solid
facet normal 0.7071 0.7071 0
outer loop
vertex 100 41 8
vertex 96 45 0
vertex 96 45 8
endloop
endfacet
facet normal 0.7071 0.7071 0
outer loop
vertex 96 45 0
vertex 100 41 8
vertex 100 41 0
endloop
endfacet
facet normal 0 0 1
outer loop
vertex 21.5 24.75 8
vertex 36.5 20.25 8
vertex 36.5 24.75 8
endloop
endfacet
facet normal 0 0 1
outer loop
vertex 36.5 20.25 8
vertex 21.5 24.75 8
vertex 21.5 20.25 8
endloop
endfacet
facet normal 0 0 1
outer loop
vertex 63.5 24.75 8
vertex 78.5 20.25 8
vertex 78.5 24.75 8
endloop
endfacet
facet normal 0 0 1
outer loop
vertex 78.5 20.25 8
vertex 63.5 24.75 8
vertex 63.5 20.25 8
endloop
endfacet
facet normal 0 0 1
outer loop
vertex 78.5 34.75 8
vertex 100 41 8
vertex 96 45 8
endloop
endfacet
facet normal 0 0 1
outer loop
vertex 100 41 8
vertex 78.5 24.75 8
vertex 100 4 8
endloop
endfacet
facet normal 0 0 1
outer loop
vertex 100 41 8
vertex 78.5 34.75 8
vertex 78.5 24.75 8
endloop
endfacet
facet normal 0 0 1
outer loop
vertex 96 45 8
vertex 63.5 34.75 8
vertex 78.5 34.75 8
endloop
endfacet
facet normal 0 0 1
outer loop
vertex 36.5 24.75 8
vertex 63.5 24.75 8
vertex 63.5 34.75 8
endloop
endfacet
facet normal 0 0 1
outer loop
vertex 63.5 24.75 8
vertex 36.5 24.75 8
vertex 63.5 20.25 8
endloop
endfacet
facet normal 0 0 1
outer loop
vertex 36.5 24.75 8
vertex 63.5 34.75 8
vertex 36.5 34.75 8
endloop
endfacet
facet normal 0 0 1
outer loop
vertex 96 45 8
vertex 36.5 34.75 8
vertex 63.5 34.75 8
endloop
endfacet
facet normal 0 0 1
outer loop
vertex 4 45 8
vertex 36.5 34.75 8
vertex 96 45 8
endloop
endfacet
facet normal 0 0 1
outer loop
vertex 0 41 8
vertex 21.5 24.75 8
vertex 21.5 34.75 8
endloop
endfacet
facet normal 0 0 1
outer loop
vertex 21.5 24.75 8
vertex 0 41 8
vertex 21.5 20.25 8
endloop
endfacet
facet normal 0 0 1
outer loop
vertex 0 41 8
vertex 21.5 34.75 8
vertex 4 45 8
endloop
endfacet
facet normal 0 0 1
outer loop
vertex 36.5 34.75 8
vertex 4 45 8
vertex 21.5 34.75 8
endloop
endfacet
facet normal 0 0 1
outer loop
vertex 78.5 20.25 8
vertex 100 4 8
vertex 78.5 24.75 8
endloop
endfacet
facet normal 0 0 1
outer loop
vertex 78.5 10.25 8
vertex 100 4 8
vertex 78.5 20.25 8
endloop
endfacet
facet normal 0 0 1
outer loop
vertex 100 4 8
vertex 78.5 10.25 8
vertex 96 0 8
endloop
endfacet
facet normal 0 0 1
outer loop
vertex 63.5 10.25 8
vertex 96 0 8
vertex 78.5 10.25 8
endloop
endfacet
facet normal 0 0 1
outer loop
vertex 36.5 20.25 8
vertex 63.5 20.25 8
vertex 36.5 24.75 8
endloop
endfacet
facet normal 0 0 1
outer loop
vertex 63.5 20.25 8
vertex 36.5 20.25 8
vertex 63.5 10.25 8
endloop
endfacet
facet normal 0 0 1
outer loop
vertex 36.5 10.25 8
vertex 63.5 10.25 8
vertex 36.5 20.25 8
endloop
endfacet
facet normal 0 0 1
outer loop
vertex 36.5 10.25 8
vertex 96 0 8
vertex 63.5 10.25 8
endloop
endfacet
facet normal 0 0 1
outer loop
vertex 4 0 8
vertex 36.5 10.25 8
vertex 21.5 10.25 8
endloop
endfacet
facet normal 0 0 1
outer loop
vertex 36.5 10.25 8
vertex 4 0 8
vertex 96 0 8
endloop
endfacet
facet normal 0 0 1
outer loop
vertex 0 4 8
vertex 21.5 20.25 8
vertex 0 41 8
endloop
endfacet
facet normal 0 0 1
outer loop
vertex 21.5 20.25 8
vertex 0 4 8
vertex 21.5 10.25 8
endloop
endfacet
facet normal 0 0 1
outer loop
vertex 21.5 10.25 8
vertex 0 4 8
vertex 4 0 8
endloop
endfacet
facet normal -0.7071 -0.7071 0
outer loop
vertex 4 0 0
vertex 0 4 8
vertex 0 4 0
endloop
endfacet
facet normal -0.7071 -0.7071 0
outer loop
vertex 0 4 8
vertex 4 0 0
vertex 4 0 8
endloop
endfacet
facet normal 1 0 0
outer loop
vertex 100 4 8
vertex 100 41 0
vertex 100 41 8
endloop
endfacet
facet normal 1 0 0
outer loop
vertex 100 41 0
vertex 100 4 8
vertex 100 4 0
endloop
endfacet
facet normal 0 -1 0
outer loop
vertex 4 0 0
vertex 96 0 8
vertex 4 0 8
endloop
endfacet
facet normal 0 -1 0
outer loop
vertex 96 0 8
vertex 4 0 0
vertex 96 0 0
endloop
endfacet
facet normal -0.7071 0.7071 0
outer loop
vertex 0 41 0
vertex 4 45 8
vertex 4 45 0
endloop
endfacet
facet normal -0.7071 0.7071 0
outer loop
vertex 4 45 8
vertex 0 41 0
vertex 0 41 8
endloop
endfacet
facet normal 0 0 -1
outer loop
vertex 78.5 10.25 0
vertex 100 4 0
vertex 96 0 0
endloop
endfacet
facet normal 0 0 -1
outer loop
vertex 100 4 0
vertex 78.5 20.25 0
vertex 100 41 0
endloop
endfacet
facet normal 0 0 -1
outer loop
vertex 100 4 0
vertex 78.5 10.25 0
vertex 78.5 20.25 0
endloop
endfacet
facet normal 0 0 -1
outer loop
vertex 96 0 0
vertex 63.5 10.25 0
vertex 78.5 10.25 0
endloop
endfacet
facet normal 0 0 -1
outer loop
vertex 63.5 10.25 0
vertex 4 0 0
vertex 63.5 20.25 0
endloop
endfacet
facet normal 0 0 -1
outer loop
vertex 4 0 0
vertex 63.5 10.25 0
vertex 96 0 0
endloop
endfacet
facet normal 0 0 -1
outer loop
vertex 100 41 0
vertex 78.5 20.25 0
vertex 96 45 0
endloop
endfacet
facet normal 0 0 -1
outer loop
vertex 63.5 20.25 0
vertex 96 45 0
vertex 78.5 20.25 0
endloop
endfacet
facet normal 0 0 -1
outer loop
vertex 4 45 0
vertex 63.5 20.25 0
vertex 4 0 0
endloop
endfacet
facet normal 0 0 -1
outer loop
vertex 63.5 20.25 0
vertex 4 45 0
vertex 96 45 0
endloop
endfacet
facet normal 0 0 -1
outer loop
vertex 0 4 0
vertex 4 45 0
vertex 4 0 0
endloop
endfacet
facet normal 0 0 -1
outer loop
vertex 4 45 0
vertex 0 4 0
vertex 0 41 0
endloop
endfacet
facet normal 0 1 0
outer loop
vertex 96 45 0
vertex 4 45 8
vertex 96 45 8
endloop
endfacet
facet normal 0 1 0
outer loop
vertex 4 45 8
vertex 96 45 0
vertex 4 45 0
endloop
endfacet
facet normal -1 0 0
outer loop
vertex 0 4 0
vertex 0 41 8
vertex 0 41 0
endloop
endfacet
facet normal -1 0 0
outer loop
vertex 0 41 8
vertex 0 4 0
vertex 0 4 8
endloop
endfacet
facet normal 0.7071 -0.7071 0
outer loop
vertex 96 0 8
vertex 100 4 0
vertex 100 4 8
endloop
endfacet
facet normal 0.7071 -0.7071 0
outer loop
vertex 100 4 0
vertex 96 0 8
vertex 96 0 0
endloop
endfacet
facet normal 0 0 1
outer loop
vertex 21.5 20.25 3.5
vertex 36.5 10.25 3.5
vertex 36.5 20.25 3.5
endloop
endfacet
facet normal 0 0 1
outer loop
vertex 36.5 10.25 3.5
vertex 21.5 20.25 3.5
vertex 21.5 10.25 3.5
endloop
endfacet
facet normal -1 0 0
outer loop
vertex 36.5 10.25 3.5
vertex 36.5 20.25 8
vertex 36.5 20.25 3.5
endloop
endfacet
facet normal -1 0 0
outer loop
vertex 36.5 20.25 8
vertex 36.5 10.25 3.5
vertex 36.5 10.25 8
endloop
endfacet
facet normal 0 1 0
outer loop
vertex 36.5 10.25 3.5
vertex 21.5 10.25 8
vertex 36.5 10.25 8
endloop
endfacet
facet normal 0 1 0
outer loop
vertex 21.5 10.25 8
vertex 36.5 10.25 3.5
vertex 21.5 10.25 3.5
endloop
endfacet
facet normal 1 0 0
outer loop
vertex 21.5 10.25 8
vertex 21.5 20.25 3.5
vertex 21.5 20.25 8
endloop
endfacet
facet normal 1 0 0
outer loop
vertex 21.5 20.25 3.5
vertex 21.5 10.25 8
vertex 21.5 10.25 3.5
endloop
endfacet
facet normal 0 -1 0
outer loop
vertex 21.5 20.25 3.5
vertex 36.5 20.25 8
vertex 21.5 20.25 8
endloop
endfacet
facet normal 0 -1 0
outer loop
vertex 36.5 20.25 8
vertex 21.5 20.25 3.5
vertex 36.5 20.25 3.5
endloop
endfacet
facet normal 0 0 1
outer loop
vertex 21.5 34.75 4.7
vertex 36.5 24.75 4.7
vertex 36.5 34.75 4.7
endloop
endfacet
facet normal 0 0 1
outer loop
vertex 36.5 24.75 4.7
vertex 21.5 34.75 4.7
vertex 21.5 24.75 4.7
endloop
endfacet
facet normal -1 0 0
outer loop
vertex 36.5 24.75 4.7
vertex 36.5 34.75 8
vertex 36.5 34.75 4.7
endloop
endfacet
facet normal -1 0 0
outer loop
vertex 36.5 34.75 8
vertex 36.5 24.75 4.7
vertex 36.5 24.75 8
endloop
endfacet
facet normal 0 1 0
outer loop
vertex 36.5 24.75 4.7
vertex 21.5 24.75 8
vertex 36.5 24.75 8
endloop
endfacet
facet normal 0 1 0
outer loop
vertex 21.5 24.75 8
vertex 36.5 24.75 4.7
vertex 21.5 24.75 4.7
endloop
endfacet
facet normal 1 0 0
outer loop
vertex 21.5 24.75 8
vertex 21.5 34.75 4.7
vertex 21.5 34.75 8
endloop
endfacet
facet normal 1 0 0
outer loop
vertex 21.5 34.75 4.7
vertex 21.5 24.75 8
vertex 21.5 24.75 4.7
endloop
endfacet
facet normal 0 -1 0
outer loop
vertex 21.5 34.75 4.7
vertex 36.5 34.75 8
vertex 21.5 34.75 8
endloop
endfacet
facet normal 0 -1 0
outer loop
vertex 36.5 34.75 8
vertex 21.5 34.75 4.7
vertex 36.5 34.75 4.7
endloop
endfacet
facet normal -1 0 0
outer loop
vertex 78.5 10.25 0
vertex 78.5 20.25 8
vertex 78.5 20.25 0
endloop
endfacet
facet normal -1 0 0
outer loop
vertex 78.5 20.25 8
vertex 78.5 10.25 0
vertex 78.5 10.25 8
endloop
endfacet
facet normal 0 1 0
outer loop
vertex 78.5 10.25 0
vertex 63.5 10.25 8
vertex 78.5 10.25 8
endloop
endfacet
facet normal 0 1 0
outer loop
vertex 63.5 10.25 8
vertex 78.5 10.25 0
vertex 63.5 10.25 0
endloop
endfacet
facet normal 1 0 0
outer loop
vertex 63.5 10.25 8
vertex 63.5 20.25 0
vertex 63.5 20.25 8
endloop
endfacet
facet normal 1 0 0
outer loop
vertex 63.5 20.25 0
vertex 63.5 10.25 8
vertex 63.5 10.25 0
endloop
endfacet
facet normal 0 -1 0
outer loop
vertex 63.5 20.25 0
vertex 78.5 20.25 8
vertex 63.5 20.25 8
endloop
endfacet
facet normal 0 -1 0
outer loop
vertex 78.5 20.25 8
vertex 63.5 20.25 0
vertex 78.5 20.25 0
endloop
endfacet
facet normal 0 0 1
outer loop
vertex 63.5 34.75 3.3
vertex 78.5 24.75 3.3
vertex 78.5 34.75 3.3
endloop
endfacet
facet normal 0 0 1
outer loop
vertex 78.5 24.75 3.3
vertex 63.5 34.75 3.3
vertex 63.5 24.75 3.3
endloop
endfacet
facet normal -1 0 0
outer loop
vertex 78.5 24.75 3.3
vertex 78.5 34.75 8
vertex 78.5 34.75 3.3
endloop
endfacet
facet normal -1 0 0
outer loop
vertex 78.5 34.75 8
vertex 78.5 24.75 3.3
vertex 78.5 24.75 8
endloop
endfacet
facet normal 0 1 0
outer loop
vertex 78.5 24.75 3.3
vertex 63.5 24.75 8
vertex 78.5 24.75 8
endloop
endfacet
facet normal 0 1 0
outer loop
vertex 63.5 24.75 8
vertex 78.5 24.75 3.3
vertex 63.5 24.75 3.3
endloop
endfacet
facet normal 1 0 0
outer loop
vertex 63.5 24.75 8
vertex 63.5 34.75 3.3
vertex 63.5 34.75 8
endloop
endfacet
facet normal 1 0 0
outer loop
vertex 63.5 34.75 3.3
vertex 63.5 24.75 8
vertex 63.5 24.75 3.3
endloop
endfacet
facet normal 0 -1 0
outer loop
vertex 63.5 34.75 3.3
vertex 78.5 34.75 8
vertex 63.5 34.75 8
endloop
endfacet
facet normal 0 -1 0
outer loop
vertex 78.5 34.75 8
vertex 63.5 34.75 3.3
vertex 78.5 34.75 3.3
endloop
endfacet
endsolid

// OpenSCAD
$fn = 32;

// ----------------------------------------------------------------------
// Windowed plate: 4 voids, 100 x 45 x 8 mm
// ----------------------------------------------------------------------

// --- parameters (mm) ---
plate_l = 100;            // plate length, X
plate_w = 45;             // plate width, Y
plate_t = 8;              // plate thickness, Z
edge_margin = 8;          // wall from the plate edge to any window
win_l = 15;               // pocket length
win_w = 10;               // pocket width
pitch_x = 42;             // grid pitch along X
pitch_y = 14.5;           // grid pitch along Y
depth_1 = 4.5;            // depth of void 1 (full thickness = through)
depth_2 = 3.3;            // depth of void 2 (full thickness = through)
depth_3 = 8;              // depth of void 3 (full thickness = through)
depth_4 = 4.7;            // depth of void 4 (full thickness = through)
corner_c = 4;             // corner chamfer of the plate

profile = [[4, 0], [96, 0], [100, 4], [100, 41], [96, 45], [4, 45], [0, 41], [0, 4]];  // primary outline, 8 points, counter clockwise
void_1 = [[21.5, 10.25], [36.5, 10.25], [36.5, 20.25], [21.5, 20.25]];  // pocket at grid node 0,0, 4 points
void_2 = [[21.5, 24.75], [36.5, 24.75], [36.5, 34.75], [21.5, 34.75]];  // pocket at grid node 0,1, 4 points
void_3 = [[63.5, 10.25], [78.5, 10.25], [78.5, 20.25], [63.5, 20.25]];  // pocket at grid node 1,0, 4 points
void_4 = [[63.5, 24.75], [78.5, 24.75], [78.5, 34.75], [63.5, 34.75]];  // pocket at grid node 1,1, 4 points

// --- the one profile operation ---
difference() {
  linear_extrude(height = plate_t) polygon(points = profile);
  translate([0, 0, plate_t - depth_1])
    linear_extrude(height = depth_1 + 1) polygon(points = void_1);
  translate([0, 0, plate_t - depth_2])
    linear_extrude(height = depth_2 + 1) polygon(points = void_2);
  translate([0, 0, -1])
    linear_extrude(height = plate_t + 2) polygon(points = void_3);
  translate([0, 0, plate_t - depth_4])
    linear_extrude(height = depth_4 + 1) polygon(points = void_4);
}
